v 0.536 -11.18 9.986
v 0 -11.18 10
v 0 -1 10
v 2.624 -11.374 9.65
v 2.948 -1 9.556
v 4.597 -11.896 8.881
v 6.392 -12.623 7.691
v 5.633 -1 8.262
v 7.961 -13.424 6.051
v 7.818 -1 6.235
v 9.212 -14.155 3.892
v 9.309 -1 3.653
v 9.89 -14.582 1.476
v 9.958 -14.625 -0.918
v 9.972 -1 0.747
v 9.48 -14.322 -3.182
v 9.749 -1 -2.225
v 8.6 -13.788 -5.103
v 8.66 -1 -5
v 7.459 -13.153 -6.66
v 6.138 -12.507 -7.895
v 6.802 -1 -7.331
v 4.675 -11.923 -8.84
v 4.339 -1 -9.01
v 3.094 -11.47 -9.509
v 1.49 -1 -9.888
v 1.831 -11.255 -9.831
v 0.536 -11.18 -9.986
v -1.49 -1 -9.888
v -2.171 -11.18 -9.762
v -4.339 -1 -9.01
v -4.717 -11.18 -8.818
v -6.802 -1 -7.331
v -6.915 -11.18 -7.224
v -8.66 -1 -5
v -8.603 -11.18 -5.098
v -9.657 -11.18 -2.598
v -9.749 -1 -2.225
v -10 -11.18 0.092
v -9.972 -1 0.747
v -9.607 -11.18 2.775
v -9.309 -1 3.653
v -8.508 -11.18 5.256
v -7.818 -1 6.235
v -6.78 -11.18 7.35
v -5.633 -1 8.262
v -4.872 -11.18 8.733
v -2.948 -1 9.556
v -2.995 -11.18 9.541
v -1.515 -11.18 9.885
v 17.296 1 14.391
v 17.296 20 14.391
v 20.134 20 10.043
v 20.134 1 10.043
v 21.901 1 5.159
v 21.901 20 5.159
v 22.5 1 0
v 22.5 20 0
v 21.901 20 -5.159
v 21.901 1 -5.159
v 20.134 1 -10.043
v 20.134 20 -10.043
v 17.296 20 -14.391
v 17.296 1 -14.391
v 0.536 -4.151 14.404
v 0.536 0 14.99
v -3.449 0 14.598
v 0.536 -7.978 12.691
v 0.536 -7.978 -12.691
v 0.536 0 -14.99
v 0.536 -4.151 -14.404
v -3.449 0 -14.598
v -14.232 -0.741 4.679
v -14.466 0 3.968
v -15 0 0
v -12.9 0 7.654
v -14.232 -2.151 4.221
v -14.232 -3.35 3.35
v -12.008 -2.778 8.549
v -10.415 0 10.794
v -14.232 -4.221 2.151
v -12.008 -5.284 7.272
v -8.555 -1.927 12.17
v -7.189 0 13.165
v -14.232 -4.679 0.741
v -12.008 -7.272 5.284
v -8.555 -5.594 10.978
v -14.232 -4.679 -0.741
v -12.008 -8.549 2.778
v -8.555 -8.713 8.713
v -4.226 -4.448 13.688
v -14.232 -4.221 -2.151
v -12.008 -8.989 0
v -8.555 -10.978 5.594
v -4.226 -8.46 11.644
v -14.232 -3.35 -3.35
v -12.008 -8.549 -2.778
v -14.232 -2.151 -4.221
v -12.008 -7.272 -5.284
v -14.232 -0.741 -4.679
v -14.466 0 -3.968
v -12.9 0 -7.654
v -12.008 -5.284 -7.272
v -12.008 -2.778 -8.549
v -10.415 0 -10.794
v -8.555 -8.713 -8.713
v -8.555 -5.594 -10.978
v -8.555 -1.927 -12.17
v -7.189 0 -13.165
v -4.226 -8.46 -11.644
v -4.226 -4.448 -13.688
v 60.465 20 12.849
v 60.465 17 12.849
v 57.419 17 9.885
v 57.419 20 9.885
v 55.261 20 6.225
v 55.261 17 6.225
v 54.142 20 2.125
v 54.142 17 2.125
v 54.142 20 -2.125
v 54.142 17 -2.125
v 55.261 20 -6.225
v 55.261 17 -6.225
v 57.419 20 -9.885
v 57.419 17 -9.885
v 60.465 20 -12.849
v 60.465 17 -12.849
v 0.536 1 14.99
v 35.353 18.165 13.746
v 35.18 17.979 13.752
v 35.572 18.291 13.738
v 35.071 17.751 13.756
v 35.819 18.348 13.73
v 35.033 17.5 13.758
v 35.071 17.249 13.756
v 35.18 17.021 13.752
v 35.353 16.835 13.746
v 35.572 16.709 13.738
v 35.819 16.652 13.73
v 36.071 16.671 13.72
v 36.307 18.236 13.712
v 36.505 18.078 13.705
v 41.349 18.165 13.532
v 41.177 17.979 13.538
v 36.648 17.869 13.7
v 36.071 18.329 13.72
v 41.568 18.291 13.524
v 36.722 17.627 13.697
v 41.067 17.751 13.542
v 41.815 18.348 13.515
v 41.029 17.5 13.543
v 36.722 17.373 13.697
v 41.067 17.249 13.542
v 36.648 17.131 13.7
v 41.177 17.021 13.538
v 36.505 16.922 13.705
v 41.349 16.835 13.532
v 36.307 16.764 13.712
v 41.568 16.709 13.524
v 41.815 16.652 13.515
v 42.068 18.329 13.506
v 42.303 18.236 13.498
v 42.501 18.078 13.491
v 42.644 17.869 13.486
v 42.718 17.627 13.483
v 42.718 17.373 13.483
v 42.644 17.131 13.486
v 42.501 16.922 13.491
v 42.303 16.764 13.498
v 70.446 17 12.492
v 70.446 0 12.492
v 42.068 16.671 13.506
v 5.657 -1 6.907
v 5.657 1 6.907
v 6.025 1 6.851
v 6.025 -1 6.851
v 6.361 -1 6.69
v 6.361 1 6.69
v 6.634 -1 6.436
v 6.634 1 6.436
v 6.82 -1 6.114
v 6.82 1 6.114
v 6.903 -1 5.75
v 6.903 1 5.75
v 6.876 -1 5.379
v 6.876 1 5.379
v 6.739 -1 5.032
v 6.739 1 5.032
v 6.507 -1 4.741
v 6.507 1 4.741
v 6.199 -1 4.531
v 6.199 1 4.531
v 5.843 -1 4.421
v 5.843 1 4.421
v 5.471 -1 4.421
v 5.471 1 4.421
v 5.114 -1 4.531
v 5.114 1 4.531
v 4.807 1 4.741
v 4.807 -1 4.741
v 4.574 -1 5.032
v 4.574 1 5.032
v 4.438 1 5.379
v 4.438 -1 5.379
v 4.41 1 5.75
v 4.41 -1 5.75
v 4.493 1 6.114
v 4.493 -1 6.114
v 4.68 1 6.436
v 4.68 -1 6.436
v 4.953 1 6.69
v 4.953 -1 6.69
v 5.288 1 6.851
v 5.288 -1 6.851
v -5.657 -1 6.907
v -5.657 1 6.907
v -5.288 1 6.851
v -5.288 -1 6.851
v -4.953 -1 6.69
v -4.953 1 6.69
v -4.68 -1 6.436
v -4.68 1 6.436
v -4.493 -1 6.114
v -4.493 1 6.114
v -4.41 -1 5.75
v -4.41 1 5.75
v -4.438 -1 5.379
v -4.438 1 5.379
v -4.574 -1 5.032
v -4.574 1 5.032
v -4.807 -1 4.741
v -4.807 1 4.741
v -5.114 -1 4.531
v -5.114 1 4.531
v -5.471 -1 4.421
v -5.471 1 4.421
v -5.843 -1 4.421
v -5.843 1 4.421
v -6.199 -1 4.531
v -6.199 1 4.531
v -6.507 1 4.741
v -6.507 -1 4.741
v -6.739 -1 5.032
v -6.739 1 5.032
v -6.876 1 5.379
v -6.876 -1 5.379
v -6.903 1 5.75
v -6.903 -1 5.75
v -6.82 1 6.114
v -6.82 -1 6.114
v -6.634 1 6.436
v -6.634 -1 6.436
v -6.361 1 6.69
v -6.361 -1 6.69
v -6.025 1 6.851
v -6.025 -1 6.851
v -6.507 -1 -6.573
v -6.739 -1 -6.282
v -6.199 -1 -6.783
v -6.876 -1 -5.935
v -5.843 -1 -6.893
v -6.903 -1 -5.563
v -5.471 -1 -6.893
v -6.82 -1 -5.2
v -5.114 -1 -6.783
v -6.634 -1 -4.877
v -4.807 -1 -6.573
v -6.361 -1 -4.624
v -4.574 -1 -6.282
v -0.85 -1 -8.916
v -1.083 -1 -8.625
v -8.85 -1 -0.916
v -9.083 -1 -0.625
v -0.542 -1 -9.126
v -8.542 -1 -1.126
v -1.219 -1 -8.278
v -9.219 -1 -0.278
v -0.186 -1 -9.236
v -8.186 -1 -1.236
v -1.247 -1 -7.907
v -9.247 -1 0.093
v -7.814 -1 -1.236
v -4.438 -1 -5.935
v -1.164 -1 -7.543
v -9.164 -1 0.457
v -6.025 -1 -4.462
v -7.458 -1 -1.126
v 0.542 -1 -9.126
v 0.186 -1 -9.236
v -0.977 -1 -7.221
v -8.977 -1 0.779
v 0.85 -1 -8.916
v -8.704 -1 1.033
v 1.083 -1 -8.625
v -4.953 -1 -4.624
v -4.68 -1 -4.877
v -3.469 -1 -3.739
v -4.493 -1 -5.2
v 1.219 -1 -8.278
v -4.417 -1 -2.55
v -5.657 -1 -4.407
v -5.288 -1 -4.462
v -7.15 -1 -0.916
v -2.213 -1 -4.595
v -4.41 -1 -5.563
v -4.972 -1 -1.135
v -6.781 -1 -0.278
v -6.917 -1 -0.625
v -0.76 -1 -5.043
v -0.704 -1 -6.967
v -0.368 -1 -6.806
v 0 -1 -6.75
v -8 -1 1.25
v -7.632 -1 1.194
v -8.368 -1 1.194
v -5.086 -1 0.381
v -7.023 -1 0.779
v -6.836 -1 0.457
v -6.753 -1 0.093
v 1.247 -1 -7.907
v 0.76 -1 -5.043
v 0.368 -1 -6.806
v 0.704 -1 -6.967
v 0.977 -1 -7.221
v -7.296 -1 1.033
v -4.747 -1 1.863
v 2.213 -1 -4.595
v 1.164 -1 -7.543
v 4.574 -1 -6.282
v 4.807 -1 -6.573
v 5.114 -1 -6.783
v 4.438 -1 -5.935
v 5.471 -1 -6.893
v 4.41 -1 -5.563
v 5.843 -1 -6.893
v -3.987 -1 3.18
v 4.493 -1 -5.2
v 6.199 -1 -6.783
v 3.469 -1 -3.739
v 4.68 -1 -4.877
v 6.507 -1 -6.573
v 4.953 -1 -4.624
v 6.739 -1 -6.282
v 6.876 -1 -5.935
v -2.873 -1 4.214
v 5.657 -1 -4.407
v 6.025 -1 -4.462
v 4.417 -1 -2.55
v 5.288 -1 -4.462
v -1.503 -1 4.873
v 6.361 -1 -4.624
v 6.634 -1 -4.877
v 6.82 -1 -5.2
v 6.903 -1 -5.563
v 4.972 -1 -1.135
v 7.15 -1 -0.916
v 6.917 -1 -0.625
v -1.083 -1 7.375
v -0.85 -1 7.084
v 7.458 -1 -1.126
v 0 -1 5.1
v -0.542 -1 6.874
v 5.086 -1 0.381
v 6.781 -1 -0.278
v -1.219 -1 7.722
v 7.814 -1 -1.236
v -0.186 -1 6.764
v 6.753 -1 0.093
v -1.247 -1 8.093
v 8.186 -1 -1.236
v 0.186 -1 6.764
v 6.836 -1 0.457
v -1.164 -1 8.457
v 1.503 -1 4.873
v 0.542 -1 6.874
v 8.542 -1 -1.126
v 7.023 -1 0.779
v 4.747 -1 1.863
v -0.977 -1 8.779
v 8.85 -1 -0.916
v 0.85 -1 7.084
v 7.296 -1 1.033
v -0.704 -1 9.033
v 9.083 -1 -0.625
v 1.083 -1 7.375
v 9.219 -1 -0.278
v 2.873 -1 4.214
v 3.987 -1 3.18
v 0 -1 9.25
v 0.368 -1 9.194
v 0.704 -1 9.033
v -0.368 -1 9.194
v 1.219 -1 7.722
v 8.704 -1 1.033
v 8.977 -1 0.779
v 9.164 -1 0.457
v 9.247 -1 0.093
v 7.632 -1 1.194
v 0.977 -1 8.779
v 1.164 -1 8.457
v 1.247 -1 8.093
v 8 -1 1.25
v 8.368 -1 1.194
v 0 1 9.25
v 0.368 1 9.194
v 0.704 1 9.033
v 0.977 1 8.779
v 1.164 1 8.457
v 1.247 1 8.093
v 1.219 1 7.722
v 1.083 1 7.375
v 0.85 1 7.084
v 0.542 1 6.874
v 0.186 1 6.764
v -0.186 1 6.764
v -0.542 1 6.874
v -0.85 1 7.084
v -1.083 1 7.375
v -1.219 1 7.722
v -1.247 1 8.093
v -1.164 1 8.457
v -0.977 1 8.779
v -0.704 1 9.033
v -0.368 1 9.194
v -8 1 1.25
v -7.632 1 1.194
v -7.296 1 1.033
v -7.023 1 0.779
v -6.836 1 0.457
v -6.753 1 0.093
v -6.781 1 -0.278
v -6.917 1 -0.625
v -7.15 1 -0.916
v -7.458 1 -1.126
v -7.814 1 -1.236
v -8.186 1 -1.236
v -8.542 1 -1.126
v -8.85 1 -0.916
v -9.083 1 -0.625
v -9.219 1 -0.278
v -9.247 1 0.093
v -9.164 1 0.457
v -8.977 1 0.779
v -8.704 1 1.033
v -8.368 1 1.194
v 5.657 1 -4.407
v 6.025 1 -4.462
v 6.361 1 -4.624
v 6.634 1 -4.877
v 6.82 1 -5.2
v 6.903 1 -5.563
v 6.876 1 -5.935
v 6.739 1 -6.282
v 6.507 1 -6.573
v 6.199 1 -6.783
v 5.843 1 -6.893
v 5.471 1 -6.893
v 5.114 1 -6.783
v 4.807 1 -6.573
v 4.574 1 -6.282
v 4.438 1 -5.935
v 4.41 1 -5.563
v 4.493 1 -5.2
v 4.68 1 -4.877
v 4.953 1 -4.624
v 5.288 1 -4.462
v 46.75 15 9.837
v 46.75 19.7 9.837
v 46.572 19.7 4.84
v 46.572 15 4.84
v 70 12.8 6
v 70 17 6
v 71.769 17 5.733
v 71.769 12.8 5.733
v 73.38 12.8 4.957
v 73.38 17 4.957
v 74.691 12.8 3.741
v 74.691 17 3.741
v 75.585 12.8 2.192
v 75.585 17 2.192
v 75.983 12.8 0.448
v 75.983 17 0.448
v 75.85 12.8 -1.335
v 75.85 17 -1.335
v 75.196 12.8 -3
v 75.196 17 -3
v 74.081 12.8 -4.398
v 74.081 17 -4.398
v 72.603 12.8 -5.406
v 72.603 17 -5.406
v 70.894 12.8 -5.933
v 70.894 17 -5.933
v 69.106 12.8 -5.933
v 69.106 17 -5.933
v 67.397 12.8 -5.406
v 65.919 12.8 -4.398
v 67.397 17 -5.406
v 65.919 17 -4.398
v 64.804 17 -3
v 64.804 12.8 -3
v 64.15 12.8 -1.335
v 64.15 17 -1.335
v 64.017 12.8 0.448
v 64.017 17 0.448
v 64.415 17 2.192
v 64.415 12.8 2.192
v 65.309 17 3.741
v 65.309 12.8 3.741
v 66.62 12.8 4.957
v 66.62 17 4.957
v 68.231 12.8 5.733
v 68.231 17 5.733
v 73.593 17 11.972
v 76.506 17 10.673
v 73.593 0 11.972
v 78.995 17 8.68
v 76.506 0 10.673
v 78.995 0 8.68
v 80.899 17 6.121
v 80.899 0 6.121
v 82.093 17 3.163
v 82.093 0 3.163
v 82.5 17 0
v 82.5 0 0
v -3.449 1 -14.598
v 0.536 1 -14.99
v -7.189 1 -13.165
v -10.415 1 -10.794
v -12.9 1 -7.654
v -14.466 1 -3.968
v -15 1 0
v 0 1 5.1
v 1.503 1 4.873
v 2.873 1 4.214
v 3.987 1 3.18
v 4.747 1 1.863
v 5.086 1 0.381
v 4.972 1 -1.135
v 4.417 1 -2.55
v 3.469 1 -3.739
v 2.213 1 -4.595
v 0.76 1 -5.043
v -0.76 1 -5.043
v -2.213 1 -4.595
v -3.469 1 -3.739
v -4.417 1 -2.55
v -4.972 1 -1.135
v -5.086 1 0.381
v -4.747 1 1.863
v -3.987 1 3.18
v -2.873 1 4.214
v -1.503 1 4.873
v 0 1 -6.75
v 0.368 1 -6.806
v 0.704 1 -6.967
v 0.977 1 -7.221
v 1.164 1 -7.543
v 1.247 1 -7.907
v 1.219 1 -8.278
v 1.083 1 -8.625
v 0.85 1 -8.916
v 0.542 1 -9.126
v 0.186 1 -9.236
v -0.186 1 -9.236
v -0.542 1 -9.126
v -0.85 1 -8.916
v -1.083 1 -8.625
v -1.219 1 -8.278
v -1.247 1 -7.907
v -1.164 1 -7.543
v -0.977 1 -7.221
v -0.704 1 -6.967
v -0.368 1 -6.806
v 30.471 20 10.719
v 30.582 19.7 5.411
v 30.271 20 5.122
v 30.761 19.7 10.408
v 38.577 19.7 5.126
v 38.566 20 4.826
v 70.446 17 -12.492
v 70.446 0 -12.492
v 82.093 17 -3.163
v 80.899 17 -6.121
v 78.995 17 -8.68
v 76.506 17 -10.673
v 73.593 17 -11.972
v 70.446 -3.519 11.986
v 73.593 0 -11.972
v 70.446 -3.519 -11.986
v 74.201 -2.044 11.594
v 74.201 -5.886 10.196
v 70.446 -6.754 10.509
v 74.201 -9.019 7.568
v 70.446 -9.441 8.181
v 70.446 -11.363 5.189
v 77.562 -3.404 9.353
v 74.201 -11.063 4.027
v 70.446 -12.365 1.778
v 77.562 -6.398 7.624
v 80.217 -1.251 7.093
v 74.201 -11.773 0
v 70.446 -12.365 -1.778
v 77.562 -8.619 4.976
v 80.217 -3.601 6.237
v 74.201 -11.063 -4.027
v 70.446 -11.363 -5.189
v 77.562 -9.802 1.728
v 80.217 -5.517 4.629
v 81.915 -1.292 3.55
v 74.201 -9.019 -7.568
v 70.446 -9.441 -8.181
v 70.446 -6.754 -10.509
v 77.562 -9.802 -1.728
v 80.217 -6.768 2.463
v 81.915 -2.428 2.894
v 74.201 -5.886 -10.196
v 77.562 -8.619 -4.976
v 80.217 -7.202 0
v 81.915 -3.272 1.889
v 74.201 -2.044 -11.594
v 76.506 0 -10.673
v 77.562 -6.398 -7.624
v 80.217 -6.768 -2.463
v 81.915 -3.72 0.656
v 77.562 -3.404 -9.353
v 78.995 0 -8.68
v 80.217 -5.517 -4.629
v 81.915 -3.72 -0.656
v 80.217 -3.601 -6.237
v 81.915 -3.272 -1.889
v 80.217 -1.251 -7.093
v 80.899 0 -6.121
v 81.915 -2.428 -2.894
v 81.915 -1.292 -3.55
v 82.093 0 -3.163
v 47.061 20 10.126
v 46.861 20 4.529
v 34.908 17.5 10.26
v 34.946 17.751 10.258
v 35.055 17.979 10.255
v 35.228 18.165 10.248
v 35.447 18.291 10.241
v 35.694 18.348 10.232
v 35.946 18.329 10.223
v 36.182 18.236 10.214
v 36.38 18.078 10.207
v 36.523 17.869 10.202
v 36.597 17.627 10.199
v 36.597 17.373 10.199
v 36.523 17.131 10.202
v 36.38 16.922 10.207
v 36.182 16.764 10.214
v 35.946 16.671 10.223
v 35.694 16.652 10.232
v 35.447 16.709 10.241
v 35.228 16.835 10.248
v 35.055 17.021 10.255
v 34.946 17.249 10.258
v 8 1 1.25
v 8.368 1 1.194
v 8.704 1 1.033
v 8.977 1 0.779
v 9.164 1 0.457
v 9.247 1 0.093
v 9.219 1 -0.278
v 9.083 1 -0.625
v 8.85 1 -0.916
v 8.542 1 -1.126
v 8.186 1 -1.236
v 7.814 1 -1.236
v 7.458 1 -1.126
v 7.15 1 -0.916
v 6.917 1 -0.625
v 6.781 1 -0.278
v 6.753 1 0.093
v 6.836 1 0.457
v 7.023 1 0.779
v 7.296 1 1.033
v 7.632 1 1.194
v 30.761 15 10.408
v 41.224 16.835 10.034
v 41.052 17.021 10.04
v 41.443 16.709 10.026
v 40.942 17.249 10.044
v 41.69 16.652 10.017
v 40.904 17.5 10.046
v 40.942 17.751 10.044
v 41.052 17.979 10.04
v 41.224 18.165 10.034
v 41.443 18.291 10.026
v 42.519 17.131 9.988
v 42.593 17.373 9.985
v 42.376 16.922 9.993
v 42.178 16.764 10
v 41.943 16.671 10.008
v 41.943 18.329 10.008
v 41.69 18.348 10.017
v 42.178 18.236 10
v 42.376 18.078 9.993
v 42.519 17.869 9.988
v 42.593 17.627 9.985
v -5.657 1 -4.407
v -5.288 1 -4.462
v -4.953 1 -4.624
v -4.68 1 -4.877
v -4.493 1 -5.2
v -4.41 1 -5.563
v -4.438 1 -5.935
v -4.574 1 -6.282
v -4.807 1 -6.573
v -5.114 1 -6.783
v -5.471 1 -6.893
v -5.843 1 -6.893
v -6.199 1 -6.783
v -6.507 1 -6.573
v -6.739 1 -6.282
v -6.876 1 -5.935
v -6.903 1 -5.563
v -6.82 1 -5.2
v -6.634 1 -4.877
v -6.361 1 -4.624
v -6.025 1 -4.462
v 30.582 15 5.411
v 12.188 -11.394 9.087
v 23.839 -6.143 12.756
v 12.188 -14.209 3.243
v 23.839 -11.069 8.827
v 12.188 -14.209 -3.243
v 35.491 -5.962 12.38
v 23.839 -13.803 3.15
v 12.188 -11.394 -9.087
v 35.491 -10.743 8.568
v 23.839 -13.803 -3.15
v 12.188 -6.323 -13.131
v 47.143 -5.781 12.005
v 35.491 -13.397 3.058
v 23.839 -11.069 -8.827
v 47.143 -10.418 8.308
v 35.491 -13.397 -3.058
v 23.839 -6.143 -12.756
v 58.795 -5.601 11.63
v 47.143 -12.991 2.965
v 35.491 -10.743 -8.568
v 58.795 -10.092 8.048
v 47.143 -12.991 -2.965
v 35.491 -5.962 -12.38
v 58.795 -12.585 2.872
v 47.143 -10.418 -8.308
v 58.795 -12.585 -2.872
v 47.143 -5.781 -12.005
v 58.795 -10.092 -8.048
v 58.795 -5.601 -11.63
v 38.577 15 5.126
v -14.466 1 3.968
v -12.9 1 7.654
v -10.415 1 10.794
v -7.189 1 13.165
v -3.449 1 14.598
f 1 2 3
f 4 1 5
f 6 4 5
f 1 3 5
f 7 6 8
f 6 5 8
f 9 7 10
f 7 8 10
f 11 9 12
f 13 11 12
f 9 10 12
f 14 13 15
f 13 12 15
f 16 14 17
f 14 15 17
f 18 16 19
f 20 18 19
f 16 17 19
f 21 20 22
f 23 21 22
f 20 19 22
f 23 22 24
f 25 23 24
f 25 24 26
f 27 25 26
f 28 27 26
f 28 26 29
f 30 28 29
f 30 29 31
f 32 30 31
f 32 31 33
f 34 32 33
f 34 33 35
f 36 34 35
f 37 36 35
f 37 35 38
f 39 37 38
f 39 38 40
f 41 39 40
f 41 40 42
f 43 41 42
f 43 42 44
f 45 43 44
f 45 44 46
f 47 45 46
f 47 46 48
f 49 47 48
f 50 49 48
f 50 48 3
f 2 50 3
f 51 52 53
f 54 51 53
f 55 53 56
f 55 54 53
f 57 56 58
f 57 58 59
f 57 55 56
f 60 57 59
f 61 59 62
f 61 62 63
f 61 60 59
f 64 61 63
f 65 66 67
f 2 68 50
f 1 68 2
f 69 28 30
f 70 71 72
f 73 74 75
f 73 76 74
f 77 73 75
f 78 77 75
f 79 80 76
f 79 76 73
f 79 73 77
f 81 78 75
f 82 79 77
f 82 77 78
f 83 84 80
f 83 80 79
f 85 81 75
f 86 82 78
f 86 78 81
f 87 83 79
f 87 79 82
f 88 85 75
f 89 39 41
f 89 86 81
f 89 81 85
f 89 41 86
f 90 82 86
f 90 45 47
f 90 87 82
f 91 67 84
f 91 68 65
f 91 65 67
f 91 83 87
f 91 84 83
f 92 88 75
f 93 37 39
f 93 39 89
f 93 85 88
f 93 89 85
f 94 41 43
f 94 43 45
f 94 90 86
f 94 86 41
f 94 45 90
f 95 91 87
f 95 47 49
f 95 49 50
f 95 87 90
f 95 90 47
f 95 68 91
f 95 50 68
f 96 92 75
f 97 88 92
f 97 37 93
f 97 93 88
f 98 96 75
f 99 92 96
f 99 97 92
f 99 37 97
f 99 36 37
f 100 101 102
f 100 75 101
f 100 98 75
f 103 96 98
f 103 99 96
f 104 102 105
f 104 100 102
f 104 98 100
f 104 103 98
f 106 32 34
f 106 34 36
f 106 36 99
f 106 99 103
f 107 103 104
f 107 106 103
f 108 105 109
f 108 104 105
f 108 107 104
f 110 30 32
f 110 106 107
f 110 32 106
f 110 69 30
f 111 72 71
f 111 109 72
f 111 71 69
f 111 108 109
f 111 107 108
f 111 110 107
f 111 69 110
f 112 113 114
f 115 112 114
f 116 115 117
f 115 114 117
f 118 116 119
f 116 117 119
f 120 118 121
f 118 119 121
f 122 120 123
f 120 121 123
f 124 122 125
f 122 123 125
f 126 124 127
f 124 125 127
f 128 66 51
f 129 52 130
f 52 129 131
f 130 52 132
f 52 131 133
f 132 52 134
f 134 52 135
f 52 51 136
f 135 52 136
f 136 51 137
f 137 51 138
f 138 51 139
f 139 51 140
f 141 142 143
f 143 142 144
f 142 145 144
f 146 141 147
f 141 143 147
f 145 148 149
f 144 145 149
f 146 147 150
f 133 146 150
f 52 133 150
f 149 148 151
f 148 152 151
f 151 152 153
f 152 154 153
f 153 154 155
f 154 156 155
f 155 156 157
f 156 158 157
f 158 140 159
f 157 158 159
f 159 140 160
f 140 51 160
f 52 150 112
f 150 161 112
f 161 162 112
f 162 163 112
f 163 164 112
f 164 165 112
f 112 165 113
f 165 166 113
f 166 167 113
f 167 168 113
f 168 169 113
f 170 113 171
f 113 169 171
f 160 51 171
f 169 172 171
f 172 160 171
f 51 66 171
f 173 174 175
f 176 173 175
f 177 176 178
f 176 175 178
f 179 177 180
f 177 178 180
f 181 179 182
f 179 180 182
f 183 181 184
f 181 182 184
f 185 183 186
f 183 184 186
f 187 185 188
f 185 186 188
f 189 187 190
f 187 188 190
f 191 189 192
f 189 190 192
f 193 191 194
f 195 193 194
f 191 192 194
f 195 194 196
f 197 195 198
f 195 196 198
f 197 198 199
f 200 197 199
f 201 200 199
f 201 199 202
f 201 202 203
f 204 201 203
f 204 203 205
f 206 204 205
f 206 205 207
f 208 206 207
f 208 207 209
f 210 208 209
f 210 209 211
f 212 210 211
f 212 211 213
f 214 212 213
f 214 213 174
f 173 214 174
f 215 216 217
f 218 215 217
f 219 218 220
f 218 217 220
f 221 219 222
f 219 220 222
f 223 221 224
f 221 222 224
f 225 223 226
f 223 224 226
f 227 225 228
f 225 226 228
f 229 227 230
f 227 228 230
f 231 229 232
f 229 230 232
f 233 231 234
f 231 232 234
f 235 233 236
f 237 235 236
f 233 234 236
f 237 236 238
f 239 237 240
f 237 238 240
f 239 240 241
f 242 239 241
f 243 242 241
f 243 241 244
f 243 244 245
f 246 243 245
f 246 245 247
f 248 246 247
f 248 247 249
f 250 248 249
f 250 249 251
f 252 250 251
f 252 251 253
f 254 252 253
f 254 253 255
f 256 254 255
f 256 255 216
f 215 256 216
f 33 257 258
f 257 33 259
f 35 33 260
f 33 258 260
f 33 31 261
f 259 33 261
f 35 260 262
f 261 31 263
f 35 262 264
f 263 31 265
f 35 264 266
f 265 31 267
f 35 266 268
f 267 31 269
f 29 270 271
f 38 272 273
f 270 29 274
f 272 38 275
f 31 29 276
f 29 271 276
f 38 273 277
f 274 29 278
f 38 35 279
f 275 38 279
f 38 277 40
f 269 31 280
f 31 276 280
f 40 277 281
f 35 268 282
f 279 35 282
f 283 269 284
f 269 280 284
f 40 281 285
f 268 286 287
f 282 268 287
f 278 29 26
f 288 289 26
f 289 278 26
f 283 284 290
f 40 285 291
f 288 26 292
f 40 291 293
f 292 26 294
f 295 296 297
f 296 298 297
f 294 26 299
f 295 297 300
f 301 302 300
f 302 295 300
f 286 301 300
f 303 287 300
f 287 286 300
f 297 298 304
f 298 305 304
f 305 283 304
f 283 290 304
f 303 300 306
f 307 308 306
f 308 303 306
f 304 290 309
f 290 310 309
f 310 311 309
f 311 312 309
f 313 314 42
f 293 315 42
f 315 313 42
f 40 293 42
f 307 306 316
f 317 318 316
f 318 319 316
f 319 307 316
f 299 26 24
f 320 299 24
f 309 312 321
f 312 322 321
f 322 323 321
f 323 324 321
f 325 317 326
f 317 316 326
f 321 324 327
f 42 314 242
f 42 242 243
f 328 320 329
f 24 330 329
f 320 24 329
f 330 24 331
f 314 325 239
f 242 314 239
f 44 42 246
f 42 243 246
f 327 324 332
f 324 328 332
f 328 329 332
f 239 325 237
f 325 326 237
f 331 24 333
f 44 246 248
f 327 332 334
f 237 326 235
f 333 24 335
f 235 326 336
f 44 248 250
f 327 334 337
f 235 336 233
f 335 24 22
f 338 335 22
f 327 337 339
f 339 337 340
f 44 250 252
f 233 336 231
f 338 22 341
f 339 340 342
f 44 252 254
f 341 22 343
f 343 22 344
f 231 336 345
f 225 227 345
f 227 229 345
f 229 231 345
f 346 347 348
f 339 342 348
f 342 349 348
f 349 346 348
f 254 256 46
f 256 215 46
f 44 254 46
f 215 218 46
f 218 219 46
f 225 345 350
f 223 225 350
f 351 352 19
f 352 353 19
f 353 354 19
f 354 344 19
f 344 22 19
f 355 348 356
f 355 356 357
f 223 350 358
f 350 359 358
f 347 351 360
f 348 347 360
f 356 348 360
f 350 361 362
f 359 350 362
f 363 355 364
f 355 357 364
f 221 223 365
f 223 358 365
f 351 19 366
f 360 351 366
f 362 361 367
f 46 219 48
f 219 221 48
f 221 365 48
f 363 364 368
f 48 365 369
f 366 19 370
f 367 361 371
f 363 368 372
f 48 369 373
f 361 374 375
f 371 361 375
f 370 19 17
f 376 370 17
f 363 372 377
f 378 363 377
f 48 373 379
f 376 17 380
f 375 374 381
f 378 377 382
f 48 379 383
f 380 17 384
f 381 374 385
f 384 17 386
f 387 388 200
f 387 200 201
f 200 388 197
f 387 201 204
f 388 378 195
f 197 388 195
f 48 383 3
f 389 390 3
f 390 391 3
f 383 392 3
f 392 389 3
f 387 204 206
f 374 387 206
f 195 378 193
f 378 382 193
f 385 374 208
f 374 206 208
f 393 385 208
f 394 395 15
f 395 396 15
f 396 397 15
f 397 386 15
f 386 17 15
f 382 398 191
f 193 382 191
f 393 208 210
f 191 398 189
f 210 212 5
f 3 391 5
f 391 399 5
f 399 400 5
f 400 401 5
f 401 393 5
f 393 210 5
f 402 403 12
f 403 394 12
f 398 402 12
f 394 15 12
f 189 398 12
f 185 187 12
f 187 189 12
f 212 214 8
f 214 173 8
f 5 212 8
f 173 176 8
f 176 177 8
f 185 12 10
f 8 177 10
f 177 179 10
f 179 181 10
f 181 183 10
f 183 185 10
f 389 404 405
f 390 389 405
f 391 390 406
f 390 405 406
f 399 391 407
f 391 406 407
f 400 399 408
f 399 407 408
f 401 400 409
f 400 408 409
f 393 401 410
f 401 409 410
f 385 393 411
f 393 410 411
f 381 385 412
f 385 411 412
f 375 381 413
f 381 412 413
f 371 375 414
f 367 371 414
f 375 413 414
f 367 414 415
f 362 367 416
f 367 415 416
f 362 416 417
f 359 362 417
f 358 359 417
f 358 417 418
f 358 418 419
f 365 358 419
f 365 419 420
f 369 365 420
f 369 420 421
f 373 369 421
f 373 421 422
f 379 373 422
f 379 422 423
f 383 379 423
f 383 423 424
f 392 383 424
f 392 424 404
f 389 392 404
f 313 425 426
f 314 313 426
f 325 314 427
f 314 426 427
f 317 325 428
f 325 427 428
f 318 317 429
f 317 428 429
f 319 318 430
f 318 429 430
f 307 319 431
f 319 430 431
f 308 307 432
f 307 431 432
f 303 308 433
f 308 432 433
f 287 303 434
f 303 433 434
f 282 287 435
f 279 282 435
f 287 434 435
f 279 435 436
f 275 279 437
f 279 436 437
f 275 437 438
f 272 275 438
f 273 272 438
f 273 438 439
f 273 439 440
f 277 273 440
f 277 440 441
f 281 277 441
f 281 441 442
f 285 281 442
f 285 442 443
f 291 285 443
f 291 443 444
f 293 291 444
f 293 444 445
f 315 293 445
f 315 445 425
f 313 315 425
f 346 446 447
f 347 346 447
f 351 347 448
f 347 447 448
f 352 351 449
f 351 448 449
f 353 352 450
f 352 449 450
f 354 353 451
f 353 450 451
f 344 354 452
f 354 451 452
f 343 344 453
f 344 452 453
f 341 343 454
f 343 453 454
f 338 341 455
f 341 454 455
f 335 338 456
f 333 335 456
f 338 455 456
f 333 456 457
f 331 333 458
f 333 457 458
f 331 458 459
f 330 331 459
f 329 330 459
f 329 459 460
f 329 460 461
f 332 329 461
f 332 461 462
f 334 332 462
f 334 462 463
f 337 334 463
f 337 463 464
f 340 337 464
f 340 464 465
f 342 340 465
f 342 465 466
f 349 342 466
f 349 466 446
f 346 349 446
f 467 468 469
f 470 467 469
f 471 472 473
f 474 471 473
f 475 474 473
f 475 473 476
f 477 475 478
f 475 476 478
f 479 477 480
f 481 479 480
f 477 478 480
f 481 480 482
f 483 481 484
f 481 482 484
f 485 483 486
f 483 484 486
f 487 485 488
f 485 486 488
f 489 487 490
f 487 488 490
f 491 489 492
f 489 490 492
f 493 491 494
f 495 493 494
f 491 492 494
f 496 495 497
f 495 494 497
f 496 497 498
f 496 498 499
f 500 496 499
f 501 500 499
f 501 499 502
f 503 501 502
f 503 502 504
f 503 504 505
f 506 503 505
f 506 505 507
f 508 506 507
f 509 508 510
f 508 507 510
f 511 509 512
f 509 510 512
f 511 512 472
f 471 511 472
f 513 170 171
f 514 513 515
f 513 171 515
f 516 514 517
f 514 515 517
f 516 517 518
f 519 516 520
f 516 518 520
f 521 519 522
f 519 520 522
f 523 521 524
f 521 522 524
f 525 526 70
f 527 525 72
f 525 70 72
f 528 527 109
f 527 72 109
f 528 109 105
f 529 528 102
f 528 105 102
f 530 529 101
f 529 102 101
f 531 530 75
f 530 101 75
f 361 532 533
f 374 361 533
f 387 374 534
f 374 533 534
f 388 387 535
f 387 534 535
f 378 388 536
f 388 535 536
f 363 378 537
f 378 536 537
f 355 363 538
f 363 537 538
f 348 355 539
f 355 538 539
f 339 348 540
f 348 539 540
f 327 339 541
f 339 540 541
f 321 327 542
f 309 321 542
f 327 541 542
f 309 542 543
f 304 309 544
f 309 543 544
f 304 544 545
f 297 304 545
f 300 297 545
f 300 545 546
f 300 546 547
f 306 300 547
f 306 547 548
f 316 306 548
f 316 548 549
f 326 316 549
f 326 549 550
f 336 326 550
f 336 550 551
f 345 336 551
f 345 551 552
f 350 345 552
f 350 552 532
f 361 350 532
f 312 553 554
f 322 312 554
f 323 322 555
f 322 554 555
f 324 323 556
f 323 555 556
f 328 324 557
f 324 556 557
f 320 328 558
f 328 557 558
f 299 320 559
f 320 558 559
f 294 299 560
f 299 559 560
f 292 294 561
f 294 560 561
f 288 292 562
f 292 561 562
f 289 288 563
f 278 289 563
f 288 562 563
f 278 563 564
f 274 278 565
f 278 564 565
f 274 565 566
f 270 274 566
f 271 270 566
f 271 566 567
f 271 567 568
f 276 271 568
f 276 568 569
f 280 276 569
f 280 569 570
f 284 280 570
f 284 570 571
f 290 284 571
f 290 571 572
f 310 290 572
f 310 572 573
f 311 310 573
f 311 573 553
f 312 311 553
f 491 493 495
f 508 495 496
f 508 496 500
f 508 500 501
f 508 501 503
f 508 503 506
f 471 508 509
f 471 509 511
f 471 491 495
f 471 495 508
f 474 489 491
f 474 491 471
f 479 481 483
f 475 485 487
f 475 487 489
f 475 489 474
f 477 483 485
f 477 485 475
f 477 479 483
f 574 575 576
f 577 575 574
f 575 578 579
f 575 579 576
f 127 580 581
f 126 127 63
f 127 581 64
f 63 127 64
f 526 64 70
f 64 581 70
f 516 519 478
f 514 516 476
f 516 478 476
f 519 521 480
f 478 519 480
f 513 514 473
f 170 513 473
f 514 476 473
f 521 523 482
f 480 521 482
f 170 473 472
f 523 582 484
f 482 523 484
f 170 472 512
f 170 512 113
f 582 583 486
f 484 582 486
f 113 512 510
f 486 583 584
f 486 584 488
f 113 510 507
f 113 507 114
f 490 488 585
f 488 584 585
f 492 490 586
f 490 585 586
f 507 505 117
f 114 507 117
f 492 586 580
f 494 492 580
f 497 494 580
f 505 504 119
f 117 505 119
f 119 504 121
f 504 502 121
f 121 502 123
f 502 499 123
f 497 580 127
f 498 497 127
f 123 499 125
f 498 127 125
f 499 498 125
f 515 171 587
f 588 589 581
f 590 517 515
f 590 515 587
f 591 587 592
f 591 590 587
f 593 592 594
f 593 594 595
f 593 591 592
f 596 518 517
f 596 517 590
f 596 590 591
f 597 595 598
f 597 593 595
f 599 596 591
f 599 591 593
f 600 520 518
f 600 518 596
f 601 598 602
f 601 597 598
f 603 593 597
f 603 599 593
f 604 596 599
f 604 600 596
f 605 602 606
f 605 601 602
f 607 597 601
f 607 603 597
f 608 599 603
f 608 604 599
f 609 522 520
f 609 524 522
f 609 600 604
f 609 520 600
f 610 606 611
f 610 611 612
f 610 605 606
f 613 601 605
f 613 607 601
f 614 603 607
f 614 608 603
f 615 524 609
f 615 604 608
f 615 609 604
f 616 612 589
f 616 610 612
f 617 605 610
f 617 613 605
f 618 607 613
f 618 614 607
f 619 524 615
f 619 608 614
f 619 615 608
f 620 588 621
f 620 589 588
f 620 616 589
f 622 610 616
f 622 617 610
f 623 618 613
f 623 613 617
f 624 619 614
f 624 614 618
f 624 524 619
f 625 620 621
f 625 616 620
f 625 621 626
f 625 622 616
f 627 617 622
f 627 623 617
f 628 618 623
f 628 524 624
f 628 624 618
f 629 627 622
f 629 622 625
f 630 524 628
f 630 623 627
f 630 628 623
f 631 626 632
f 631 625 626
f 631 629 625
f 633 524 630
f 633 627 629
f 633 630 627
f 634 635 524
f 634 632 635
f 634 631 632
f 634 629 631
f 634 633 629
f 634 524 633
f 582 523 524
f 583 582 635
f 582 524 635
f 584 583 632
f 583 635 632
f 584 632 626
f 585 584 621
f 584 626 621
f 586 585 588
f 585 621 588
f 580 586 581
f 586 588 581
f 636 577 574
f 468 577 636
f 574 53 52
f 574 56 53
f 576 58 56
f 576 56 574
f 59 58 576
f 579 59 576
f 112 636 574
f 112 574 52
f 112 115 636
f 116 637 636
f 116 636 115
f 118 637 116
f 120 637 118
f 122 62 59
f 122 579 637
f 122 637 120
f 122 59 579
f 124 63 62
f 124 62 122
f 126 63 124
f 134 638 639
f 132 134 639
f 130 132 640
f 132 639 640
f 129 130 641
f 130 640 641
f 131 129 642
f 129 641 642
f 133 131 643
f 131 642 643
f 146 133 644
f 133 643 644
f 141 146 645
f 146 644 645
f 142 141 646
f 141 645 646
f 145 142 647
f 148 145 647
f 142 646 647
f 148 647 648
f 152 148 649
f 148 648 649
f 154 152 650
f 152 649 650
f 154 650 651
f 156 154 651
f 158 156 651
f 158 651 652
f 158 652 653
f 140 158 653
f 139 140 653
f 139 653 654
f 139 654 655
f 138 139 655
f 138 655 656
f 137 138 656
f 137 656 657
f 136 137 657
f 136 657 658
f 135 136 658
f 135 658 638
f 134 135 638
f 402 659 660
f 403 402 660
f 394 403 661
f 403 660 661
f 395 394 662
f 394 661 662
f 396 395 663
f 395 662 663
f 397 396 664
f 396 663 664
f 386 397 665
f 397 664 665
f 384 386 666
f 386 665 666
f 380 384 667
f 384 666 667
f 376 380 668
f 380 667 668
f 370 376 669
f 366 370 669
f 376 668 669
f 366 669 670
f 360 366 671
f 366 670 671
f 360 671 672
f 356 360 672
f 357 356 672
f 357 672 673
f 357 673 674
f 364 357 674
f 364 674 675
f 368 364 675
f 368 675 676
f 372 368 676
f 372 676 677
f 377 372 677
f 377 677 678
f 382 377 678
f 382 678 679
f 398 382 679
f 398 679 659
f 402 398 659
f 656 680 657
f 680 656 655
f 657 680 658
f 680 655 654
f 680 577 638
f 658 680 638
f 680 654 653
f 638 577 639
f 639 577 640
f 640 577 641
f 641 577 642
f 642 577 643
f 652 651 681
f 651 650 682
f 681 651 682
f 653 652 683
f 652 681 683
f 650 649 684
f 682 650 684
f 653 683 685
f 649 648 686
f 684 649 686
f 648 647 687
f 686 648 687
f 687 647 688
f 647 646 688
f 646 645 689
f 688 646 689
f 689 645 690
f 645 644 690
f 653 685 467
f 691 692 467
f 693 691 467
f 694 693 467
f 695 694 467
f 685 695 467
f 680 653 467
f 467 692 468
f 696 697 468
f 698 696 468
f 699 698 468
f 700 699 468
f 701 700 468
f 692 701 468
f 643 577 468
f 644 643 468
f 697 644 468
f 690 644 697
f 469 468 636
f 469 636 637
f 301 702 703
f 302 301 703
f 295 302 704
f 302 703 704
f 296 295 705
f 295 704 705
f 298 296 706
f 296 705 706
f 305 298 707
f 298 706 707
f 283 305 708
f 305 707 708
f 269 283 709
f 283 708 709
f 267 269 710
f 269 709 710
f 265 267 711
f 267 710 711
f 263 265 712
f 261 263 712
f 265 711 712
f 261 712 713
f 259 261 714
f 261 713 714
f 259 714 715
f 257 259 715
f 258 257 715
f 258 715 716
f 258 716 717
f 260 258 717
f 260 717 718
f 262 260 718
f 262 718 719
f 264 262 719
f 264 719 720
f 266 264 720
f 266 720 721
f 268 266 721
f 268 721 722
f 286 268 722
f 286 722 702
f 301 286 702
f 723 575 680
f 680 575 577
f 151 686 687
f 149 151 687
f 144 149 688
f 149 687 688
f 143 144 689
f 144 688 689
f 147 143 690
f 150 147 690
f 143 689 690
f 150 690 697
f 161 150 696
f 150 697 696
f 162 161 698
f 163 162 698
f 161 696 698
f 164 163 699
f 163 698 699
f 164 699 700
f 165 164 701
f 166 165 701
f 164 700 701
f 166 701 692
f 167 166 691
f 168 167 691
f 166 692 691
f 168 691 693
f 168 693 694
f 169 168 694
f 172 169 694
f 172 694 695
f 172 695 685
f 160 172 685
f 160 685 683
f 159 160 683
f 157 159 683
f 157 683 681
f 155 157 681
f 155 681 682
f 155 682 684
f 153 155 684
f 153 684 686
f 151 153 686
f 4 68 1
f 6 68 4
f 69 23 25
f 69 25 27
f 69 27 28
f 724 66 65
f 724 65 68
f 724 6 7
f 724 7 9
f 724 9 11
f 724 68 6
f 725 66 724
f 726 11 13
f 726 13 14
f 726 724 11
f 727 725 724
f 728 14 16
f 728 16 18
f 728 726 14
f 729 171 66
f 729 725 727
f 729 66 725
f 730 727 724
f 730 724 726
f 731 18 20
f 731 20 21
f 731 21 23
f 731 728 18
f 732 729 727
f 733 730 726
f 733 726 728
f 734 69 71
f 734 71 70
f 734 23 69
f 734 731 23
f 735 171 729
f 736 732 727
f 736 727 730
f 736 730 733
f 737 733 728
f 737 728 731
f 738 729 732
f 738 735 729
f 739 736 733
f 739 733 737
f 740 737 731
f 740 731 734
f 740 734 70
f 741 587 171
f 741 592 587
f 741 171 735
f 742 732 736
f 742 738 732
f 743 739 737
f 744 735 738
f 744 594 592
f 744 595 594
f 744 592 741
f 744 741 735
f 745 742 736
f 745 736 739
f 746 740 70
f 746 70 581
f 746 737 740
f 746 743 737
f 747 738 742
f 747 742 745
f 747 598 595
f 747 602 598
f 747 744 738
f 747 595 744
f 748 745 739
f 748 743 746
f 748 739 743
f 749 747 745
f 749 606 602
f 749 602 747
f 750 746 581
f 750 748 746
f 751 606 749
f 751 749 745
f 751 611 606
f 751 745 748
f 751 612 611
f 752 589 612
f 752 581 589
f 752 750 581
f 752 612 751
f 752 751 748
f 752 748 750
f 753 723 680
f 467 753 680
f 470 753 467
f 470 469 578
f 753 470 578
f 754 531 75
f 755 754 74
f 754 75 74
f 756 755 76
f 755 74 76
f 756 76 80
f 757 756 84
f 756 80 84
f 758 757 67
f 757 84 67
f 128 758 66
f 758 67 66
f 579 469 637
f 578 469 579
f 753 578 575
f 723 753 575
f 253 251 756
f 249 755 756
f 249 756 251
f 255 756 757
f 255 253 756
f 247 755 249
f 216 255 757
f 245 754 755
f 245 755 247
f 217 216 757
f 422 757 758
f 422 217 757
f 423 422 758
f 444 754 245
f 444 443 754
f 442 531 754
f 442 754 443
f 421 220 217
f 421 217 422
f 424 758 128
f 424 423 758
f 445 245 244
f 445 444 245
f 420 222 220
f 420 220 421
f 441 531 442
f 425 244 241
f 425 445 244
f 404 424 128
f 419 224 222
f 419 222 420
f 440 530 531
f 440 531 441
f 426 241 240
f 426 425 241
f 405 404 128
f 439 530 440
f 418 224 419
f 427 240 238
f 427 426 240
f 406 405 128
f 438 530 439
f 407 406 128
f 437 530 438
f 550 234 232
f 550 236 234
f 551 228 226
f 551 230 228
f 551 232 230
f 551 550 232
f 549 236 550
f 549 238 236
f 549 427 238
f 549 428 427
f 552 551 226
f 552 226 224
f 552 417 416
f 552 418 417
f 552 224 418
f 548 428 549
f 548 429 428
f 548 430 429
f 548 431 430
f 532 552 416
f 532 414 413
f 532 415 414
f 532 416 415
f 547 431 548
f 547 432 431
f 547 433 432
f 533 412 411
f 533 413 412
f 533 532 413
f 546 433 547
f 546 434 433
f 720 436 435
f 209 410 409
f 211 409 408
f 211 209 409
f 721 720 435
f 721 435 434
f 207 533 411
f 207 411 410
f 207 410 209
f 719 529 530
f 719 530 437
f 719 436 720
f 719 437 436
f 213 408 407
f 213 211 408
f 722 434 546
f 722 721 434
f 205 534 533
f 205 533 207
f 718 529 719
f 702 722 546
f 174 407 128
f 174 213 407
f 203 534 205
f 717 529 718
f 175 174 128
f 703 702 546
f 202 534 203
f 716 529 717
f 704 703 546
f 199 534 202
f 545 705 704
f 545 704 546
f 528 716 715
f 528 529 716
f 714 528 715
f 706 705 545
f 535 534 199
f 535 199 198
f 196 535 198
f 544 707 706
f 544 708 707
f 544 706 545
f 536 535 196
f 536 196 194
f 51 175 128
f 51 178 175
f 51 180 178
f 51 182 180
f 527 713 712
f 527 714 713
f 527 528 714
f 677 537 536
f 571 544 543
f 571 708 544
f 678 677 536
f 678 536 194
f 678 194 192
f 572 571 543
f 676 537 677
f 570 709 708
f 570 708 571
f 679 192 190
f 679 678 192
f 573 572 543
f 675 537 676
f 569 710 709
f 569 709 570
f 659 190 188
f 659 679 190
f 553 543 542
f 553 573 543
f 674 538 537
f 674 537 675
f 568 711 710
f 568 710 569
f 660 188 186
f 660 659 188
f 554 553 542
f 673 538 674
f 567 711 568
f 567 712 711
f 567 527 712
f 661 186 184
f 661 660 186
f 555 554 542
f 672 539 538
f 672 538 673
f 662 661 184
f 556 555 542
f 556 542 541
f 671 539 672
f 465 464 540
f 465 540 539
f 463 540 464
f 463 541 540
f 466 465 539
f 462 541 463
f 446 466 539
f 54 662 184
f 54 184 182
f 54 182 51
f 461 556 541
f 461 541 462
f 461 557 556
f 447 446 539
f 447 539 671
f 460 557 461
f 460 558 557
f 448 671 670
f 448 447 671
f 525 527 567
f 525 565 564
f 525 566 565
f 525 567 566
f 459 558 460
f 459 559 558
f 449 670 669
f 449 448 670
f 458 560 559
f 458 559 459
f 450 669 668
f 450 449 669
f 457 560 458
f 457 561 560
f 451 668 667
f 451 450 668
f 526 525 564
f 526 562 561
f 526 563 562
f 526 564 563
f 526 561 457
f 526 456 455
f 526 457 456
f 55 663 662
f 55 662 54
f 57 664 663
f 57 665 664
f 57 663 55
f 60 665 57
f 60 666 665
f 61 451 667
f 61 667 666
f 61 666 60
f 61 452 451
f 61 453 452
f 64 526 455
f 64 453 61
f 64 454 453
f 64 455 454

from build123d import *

# Parameters (mm, degrees)
EXTRUDE_1_DEPTH     = 20
REVOLVE_1_ANGLE     = 180
CUT_EXTRUDE_START   = -19
CUT_EXTRUDE_1_DEPTH = 19
SKETCH_5_R          = 10
CUT_EXTRUDE_2_DEPTH = 87.442177205
SKETCH_4_R          = 1.25
SKETCH_4_R_2        = 5.1
CUT_EXTRUDE_3_DEPTH = 86.97819491
CUT_EXTRUDE_START_2 = -3
CUT_EXTRUDE_5_DEPTH = 3
SKETCH_6_R          = 6
CUT_EXTRUDE_4_DEPTH = 4.2
CUT_EXTRUDE_6_DEPTH = 5
HOLE_WIZARD_1_D     = 1.7
HOLE_WIZARD_1_DEPTH = 3.5
CHAMFER_1_SIZE      = 0.3


with BuildPart() as part:
    # 草图2 → 凸台-拉伸1 (new body)
    with BuildSketch(Plane(origin=(0, 0, 0), x_dir=(1, 0, 0), z_dir=(0, 1, 0))):
        with BuildLine():
            Line((70.446428571, 12.492025518), (0.535714286, 14.990430621))
            ThreePointArc((0.535714286, 14.990430621), (-10.415476122, 10.794343757), (-15, 0))
            Line((-15, 0), (82.5, 0))
            ThreePointArc((82.5, 0), (78.995286464, 8.679563435), (70.446428571, 12.492025518))
        make_face()
        with BuildLine():
            Line((82.5, 0), (-15, 0))
            ThreePointArc((-15, 0), (-10.415476122, -10.794343757), (0.535714286, -14.990430621))
            Line((0.535714286, -14.990430621), (70.446428571, -12.492025518))
            ThreePointArc((70.446428571, -12.492025518), (78.995286464, -8.679563435), (82.5, 0))
        make_face()
    extrude(amount=EXTRUDE_1_DEPTH)

    # 草图1 → 旋转1 (revolve)
    with BuildSketch(Plane(origin=(0, 0, 0), x_dir=(1, 0, 0), z_dir=(0, 1, 0))):
        with BuildLine():
            Line((0.535714286, -14.990430621), (70.446428571, -12.492025518))
            ThreePointArc((70.446428571, -12.492025518), (78.995286464, -8.679563435), (82.5, 0))
            Line((82.5, 0), (-15, 0))
            ThreePointArc((-15, 0), (-10.415476122, -10.794343757), (0.535714286, -14.990430621))
        make_face()
    revolve(axis=Axis((70, 0, 0), (1, 0, 0)), revolution_arc=REVOLVE_1_ANGLE)

    # 草图3 → 切除-拉伸1 (cut)
    with BuildSketch(Plane(origin=(0, 20, 0), x_dir=(1, 0, 0), z_dir=(0, 1, 0)).offset(CUT_EXTRUDE_START)):
        with BuildLine():
            Line((17.295525226, 14.391483841), (0.535714286, 14.990430621))
            ThreePointArc((0.535714286, 14.990430621), (-15, 0), (0.535714286, -14.990430621))
            Line((0.535714286, -14.990430621), (17.295525226, -14.391483841))
            ThreePointArc((17.295525226, -14.391483841), (22.5, 0), (17.295525226, 14.391483841))
        make_face()
    extrude(amount=CUT_EXTRUDE_1_DEPTH, mode=Mode.SUBTRACT)

    # 草图5 → 切除-拉伸2 (cut, through all)
    with BuildSketch(Plane(origin=(0, -1, 0), x_dir=(1, 0, 0), z_dir=(0, 1, 0))):
        with Locations(Location((0, 0, 0), (0, 0, 270))):
            Circle(SKETCH_5_R)
    extrude(amount=-CUT_EXTRUDE_2_DEPTH, mode=Mode.SUBTRACT)

    # 草图4 → 切除-拉伸3 (cut, through all)
    with BuildSketch(Plane(origin=(0, 1, 0), x_dir=(1, 0, 0), z_dir=(0, 1, 0))):
        with Locations(Location((8, 0, 0), (0, 0, 270))):
            Circle(SKETCH_4_R)
        with Locations(Location((5.656854249, -5.656854249, 0), (0, 0, 270))):
            Circle(SKETCH_4_R)
        with Locations(Location((0, -8, 0), (0, 0, 270))):
            Circle(SKETCH_4_R)
        with Locations(Location((-5.656854249, -5.656854249, 0), (0, 0, 270))):
            Circle(SKETCH_4_R)
        with Locations(Location((-8, 0, 0), (0, 0, 270))):
            Circle(SKETCH_4_R)
        with Locations(Location((-5.656854249, 5.656854249, 0), (0, 0, 270))):
            Circle(SKETCH_4_R)
        with Locations(Location((0, 8, 0), (0, 0, 270))):
            Circle(SKETCH_4_R)
        with Locations(Location((5.656854249, 5.656854249, 0), (0, 0, 270))):
            Circle(SKETCH_4_R)
        with Locations(Location((0, 0, 0), (0, 0, 270))):
            Circle(SKETCH_4_R_2)
    extrude(amount=-CUT_EXTRUDE_3_DEPTH, mode=Mode.SUBTRACT)

    # 草图11 → 切除-拉伸5 (cut)
    with BuildSketch(Plane(origin=(0, 20, 0), x_dir=(1, 0, 0), z_dir=(0, 1, 0)).offset(CUT_EXTRUDE_START_2)):
        with BuildLine():
            Line((60.465308, 12.848721667), (70.446428571, 12.492025518))
            ThreePointArc((70.446428571, 12.492025518), (82.5, 0), (70.446428571, -12.492025518))
            Line((70.446428571, -12.492025518), (60.465308, -12.848721667))
            ThreePointArc((60.465308, -12.848721667), (54, 0), (60.465308, 12.848721667))
        make_face()
    extrude(amount=CUT_EXTRUDE_5_DEPTH, mode=Mode.SUBTRACT)

    # 草图6 → 切除-拉伸4 (cut)
    with BuildSketch(Plane(origin=(0, 17, 0), x_dir=(1, 0, 0), z_dir=(0, 1, 0))):
        with Locations(Location((70, 0, 0), (0, 0, 270))):
            Circle(SKETCH_6_R)
    extrude(amount=-CUT_EXTRUDE_4_DEPTH, mode=Mode.SUBTRACT)

    # 草图12 → 切除-拉伸6 (cut)
    with BuildSketch(Plane(origin=(0, 20, 0), x_dir=(1, 0, 0), z_dir=(0, 1, 0))):
        Polygon((30.581948853, -5.411239688), (30.760520282, -10.408049895), (38.755416613, -10.122335609), (38.576845185, -5.125525402), align=None)
        Polygon((38.576845185, -5.125525402), (38.755416613, -10.122335609), (46.750312944, -9.836621323), (46.571741516, -4.839811116), align=None)
    extrude(amount=-CUT_EXTRUDE_6_DEPTH, mode=Mode.SUBTRACT)

    # 孔1
    with Locations(Plane(origin=(0.535714286, 0, 14.990430621), x_dir=(0.9993620414023731, 0, -0.035714285714285726), z_dir=(0.035714285714285726, 0, 0.9993620414023731))):
        with Locations((35.369180276, 17.5), (41.369180276, 17.5)):
            Hole(HOLE_WIZARD_1_D / 2, depth=HOLE_WIZARD_1_DEPTH)

    # 倒角1
    chamfer_1_edges = [part.edges().sort_by_distance(p)[0] for p in [
        (38.755416613, 20, 10.122335609),
        (46.66102723, 20, 7.33821622),
        (38.576845185, 20, 5.125525402),
        (30.671234568, 20, 7.909644791),
    ]]
    chamfer(chamfer_1_edges, length=CHAMFER_1_SIZE)


solid = part.part
